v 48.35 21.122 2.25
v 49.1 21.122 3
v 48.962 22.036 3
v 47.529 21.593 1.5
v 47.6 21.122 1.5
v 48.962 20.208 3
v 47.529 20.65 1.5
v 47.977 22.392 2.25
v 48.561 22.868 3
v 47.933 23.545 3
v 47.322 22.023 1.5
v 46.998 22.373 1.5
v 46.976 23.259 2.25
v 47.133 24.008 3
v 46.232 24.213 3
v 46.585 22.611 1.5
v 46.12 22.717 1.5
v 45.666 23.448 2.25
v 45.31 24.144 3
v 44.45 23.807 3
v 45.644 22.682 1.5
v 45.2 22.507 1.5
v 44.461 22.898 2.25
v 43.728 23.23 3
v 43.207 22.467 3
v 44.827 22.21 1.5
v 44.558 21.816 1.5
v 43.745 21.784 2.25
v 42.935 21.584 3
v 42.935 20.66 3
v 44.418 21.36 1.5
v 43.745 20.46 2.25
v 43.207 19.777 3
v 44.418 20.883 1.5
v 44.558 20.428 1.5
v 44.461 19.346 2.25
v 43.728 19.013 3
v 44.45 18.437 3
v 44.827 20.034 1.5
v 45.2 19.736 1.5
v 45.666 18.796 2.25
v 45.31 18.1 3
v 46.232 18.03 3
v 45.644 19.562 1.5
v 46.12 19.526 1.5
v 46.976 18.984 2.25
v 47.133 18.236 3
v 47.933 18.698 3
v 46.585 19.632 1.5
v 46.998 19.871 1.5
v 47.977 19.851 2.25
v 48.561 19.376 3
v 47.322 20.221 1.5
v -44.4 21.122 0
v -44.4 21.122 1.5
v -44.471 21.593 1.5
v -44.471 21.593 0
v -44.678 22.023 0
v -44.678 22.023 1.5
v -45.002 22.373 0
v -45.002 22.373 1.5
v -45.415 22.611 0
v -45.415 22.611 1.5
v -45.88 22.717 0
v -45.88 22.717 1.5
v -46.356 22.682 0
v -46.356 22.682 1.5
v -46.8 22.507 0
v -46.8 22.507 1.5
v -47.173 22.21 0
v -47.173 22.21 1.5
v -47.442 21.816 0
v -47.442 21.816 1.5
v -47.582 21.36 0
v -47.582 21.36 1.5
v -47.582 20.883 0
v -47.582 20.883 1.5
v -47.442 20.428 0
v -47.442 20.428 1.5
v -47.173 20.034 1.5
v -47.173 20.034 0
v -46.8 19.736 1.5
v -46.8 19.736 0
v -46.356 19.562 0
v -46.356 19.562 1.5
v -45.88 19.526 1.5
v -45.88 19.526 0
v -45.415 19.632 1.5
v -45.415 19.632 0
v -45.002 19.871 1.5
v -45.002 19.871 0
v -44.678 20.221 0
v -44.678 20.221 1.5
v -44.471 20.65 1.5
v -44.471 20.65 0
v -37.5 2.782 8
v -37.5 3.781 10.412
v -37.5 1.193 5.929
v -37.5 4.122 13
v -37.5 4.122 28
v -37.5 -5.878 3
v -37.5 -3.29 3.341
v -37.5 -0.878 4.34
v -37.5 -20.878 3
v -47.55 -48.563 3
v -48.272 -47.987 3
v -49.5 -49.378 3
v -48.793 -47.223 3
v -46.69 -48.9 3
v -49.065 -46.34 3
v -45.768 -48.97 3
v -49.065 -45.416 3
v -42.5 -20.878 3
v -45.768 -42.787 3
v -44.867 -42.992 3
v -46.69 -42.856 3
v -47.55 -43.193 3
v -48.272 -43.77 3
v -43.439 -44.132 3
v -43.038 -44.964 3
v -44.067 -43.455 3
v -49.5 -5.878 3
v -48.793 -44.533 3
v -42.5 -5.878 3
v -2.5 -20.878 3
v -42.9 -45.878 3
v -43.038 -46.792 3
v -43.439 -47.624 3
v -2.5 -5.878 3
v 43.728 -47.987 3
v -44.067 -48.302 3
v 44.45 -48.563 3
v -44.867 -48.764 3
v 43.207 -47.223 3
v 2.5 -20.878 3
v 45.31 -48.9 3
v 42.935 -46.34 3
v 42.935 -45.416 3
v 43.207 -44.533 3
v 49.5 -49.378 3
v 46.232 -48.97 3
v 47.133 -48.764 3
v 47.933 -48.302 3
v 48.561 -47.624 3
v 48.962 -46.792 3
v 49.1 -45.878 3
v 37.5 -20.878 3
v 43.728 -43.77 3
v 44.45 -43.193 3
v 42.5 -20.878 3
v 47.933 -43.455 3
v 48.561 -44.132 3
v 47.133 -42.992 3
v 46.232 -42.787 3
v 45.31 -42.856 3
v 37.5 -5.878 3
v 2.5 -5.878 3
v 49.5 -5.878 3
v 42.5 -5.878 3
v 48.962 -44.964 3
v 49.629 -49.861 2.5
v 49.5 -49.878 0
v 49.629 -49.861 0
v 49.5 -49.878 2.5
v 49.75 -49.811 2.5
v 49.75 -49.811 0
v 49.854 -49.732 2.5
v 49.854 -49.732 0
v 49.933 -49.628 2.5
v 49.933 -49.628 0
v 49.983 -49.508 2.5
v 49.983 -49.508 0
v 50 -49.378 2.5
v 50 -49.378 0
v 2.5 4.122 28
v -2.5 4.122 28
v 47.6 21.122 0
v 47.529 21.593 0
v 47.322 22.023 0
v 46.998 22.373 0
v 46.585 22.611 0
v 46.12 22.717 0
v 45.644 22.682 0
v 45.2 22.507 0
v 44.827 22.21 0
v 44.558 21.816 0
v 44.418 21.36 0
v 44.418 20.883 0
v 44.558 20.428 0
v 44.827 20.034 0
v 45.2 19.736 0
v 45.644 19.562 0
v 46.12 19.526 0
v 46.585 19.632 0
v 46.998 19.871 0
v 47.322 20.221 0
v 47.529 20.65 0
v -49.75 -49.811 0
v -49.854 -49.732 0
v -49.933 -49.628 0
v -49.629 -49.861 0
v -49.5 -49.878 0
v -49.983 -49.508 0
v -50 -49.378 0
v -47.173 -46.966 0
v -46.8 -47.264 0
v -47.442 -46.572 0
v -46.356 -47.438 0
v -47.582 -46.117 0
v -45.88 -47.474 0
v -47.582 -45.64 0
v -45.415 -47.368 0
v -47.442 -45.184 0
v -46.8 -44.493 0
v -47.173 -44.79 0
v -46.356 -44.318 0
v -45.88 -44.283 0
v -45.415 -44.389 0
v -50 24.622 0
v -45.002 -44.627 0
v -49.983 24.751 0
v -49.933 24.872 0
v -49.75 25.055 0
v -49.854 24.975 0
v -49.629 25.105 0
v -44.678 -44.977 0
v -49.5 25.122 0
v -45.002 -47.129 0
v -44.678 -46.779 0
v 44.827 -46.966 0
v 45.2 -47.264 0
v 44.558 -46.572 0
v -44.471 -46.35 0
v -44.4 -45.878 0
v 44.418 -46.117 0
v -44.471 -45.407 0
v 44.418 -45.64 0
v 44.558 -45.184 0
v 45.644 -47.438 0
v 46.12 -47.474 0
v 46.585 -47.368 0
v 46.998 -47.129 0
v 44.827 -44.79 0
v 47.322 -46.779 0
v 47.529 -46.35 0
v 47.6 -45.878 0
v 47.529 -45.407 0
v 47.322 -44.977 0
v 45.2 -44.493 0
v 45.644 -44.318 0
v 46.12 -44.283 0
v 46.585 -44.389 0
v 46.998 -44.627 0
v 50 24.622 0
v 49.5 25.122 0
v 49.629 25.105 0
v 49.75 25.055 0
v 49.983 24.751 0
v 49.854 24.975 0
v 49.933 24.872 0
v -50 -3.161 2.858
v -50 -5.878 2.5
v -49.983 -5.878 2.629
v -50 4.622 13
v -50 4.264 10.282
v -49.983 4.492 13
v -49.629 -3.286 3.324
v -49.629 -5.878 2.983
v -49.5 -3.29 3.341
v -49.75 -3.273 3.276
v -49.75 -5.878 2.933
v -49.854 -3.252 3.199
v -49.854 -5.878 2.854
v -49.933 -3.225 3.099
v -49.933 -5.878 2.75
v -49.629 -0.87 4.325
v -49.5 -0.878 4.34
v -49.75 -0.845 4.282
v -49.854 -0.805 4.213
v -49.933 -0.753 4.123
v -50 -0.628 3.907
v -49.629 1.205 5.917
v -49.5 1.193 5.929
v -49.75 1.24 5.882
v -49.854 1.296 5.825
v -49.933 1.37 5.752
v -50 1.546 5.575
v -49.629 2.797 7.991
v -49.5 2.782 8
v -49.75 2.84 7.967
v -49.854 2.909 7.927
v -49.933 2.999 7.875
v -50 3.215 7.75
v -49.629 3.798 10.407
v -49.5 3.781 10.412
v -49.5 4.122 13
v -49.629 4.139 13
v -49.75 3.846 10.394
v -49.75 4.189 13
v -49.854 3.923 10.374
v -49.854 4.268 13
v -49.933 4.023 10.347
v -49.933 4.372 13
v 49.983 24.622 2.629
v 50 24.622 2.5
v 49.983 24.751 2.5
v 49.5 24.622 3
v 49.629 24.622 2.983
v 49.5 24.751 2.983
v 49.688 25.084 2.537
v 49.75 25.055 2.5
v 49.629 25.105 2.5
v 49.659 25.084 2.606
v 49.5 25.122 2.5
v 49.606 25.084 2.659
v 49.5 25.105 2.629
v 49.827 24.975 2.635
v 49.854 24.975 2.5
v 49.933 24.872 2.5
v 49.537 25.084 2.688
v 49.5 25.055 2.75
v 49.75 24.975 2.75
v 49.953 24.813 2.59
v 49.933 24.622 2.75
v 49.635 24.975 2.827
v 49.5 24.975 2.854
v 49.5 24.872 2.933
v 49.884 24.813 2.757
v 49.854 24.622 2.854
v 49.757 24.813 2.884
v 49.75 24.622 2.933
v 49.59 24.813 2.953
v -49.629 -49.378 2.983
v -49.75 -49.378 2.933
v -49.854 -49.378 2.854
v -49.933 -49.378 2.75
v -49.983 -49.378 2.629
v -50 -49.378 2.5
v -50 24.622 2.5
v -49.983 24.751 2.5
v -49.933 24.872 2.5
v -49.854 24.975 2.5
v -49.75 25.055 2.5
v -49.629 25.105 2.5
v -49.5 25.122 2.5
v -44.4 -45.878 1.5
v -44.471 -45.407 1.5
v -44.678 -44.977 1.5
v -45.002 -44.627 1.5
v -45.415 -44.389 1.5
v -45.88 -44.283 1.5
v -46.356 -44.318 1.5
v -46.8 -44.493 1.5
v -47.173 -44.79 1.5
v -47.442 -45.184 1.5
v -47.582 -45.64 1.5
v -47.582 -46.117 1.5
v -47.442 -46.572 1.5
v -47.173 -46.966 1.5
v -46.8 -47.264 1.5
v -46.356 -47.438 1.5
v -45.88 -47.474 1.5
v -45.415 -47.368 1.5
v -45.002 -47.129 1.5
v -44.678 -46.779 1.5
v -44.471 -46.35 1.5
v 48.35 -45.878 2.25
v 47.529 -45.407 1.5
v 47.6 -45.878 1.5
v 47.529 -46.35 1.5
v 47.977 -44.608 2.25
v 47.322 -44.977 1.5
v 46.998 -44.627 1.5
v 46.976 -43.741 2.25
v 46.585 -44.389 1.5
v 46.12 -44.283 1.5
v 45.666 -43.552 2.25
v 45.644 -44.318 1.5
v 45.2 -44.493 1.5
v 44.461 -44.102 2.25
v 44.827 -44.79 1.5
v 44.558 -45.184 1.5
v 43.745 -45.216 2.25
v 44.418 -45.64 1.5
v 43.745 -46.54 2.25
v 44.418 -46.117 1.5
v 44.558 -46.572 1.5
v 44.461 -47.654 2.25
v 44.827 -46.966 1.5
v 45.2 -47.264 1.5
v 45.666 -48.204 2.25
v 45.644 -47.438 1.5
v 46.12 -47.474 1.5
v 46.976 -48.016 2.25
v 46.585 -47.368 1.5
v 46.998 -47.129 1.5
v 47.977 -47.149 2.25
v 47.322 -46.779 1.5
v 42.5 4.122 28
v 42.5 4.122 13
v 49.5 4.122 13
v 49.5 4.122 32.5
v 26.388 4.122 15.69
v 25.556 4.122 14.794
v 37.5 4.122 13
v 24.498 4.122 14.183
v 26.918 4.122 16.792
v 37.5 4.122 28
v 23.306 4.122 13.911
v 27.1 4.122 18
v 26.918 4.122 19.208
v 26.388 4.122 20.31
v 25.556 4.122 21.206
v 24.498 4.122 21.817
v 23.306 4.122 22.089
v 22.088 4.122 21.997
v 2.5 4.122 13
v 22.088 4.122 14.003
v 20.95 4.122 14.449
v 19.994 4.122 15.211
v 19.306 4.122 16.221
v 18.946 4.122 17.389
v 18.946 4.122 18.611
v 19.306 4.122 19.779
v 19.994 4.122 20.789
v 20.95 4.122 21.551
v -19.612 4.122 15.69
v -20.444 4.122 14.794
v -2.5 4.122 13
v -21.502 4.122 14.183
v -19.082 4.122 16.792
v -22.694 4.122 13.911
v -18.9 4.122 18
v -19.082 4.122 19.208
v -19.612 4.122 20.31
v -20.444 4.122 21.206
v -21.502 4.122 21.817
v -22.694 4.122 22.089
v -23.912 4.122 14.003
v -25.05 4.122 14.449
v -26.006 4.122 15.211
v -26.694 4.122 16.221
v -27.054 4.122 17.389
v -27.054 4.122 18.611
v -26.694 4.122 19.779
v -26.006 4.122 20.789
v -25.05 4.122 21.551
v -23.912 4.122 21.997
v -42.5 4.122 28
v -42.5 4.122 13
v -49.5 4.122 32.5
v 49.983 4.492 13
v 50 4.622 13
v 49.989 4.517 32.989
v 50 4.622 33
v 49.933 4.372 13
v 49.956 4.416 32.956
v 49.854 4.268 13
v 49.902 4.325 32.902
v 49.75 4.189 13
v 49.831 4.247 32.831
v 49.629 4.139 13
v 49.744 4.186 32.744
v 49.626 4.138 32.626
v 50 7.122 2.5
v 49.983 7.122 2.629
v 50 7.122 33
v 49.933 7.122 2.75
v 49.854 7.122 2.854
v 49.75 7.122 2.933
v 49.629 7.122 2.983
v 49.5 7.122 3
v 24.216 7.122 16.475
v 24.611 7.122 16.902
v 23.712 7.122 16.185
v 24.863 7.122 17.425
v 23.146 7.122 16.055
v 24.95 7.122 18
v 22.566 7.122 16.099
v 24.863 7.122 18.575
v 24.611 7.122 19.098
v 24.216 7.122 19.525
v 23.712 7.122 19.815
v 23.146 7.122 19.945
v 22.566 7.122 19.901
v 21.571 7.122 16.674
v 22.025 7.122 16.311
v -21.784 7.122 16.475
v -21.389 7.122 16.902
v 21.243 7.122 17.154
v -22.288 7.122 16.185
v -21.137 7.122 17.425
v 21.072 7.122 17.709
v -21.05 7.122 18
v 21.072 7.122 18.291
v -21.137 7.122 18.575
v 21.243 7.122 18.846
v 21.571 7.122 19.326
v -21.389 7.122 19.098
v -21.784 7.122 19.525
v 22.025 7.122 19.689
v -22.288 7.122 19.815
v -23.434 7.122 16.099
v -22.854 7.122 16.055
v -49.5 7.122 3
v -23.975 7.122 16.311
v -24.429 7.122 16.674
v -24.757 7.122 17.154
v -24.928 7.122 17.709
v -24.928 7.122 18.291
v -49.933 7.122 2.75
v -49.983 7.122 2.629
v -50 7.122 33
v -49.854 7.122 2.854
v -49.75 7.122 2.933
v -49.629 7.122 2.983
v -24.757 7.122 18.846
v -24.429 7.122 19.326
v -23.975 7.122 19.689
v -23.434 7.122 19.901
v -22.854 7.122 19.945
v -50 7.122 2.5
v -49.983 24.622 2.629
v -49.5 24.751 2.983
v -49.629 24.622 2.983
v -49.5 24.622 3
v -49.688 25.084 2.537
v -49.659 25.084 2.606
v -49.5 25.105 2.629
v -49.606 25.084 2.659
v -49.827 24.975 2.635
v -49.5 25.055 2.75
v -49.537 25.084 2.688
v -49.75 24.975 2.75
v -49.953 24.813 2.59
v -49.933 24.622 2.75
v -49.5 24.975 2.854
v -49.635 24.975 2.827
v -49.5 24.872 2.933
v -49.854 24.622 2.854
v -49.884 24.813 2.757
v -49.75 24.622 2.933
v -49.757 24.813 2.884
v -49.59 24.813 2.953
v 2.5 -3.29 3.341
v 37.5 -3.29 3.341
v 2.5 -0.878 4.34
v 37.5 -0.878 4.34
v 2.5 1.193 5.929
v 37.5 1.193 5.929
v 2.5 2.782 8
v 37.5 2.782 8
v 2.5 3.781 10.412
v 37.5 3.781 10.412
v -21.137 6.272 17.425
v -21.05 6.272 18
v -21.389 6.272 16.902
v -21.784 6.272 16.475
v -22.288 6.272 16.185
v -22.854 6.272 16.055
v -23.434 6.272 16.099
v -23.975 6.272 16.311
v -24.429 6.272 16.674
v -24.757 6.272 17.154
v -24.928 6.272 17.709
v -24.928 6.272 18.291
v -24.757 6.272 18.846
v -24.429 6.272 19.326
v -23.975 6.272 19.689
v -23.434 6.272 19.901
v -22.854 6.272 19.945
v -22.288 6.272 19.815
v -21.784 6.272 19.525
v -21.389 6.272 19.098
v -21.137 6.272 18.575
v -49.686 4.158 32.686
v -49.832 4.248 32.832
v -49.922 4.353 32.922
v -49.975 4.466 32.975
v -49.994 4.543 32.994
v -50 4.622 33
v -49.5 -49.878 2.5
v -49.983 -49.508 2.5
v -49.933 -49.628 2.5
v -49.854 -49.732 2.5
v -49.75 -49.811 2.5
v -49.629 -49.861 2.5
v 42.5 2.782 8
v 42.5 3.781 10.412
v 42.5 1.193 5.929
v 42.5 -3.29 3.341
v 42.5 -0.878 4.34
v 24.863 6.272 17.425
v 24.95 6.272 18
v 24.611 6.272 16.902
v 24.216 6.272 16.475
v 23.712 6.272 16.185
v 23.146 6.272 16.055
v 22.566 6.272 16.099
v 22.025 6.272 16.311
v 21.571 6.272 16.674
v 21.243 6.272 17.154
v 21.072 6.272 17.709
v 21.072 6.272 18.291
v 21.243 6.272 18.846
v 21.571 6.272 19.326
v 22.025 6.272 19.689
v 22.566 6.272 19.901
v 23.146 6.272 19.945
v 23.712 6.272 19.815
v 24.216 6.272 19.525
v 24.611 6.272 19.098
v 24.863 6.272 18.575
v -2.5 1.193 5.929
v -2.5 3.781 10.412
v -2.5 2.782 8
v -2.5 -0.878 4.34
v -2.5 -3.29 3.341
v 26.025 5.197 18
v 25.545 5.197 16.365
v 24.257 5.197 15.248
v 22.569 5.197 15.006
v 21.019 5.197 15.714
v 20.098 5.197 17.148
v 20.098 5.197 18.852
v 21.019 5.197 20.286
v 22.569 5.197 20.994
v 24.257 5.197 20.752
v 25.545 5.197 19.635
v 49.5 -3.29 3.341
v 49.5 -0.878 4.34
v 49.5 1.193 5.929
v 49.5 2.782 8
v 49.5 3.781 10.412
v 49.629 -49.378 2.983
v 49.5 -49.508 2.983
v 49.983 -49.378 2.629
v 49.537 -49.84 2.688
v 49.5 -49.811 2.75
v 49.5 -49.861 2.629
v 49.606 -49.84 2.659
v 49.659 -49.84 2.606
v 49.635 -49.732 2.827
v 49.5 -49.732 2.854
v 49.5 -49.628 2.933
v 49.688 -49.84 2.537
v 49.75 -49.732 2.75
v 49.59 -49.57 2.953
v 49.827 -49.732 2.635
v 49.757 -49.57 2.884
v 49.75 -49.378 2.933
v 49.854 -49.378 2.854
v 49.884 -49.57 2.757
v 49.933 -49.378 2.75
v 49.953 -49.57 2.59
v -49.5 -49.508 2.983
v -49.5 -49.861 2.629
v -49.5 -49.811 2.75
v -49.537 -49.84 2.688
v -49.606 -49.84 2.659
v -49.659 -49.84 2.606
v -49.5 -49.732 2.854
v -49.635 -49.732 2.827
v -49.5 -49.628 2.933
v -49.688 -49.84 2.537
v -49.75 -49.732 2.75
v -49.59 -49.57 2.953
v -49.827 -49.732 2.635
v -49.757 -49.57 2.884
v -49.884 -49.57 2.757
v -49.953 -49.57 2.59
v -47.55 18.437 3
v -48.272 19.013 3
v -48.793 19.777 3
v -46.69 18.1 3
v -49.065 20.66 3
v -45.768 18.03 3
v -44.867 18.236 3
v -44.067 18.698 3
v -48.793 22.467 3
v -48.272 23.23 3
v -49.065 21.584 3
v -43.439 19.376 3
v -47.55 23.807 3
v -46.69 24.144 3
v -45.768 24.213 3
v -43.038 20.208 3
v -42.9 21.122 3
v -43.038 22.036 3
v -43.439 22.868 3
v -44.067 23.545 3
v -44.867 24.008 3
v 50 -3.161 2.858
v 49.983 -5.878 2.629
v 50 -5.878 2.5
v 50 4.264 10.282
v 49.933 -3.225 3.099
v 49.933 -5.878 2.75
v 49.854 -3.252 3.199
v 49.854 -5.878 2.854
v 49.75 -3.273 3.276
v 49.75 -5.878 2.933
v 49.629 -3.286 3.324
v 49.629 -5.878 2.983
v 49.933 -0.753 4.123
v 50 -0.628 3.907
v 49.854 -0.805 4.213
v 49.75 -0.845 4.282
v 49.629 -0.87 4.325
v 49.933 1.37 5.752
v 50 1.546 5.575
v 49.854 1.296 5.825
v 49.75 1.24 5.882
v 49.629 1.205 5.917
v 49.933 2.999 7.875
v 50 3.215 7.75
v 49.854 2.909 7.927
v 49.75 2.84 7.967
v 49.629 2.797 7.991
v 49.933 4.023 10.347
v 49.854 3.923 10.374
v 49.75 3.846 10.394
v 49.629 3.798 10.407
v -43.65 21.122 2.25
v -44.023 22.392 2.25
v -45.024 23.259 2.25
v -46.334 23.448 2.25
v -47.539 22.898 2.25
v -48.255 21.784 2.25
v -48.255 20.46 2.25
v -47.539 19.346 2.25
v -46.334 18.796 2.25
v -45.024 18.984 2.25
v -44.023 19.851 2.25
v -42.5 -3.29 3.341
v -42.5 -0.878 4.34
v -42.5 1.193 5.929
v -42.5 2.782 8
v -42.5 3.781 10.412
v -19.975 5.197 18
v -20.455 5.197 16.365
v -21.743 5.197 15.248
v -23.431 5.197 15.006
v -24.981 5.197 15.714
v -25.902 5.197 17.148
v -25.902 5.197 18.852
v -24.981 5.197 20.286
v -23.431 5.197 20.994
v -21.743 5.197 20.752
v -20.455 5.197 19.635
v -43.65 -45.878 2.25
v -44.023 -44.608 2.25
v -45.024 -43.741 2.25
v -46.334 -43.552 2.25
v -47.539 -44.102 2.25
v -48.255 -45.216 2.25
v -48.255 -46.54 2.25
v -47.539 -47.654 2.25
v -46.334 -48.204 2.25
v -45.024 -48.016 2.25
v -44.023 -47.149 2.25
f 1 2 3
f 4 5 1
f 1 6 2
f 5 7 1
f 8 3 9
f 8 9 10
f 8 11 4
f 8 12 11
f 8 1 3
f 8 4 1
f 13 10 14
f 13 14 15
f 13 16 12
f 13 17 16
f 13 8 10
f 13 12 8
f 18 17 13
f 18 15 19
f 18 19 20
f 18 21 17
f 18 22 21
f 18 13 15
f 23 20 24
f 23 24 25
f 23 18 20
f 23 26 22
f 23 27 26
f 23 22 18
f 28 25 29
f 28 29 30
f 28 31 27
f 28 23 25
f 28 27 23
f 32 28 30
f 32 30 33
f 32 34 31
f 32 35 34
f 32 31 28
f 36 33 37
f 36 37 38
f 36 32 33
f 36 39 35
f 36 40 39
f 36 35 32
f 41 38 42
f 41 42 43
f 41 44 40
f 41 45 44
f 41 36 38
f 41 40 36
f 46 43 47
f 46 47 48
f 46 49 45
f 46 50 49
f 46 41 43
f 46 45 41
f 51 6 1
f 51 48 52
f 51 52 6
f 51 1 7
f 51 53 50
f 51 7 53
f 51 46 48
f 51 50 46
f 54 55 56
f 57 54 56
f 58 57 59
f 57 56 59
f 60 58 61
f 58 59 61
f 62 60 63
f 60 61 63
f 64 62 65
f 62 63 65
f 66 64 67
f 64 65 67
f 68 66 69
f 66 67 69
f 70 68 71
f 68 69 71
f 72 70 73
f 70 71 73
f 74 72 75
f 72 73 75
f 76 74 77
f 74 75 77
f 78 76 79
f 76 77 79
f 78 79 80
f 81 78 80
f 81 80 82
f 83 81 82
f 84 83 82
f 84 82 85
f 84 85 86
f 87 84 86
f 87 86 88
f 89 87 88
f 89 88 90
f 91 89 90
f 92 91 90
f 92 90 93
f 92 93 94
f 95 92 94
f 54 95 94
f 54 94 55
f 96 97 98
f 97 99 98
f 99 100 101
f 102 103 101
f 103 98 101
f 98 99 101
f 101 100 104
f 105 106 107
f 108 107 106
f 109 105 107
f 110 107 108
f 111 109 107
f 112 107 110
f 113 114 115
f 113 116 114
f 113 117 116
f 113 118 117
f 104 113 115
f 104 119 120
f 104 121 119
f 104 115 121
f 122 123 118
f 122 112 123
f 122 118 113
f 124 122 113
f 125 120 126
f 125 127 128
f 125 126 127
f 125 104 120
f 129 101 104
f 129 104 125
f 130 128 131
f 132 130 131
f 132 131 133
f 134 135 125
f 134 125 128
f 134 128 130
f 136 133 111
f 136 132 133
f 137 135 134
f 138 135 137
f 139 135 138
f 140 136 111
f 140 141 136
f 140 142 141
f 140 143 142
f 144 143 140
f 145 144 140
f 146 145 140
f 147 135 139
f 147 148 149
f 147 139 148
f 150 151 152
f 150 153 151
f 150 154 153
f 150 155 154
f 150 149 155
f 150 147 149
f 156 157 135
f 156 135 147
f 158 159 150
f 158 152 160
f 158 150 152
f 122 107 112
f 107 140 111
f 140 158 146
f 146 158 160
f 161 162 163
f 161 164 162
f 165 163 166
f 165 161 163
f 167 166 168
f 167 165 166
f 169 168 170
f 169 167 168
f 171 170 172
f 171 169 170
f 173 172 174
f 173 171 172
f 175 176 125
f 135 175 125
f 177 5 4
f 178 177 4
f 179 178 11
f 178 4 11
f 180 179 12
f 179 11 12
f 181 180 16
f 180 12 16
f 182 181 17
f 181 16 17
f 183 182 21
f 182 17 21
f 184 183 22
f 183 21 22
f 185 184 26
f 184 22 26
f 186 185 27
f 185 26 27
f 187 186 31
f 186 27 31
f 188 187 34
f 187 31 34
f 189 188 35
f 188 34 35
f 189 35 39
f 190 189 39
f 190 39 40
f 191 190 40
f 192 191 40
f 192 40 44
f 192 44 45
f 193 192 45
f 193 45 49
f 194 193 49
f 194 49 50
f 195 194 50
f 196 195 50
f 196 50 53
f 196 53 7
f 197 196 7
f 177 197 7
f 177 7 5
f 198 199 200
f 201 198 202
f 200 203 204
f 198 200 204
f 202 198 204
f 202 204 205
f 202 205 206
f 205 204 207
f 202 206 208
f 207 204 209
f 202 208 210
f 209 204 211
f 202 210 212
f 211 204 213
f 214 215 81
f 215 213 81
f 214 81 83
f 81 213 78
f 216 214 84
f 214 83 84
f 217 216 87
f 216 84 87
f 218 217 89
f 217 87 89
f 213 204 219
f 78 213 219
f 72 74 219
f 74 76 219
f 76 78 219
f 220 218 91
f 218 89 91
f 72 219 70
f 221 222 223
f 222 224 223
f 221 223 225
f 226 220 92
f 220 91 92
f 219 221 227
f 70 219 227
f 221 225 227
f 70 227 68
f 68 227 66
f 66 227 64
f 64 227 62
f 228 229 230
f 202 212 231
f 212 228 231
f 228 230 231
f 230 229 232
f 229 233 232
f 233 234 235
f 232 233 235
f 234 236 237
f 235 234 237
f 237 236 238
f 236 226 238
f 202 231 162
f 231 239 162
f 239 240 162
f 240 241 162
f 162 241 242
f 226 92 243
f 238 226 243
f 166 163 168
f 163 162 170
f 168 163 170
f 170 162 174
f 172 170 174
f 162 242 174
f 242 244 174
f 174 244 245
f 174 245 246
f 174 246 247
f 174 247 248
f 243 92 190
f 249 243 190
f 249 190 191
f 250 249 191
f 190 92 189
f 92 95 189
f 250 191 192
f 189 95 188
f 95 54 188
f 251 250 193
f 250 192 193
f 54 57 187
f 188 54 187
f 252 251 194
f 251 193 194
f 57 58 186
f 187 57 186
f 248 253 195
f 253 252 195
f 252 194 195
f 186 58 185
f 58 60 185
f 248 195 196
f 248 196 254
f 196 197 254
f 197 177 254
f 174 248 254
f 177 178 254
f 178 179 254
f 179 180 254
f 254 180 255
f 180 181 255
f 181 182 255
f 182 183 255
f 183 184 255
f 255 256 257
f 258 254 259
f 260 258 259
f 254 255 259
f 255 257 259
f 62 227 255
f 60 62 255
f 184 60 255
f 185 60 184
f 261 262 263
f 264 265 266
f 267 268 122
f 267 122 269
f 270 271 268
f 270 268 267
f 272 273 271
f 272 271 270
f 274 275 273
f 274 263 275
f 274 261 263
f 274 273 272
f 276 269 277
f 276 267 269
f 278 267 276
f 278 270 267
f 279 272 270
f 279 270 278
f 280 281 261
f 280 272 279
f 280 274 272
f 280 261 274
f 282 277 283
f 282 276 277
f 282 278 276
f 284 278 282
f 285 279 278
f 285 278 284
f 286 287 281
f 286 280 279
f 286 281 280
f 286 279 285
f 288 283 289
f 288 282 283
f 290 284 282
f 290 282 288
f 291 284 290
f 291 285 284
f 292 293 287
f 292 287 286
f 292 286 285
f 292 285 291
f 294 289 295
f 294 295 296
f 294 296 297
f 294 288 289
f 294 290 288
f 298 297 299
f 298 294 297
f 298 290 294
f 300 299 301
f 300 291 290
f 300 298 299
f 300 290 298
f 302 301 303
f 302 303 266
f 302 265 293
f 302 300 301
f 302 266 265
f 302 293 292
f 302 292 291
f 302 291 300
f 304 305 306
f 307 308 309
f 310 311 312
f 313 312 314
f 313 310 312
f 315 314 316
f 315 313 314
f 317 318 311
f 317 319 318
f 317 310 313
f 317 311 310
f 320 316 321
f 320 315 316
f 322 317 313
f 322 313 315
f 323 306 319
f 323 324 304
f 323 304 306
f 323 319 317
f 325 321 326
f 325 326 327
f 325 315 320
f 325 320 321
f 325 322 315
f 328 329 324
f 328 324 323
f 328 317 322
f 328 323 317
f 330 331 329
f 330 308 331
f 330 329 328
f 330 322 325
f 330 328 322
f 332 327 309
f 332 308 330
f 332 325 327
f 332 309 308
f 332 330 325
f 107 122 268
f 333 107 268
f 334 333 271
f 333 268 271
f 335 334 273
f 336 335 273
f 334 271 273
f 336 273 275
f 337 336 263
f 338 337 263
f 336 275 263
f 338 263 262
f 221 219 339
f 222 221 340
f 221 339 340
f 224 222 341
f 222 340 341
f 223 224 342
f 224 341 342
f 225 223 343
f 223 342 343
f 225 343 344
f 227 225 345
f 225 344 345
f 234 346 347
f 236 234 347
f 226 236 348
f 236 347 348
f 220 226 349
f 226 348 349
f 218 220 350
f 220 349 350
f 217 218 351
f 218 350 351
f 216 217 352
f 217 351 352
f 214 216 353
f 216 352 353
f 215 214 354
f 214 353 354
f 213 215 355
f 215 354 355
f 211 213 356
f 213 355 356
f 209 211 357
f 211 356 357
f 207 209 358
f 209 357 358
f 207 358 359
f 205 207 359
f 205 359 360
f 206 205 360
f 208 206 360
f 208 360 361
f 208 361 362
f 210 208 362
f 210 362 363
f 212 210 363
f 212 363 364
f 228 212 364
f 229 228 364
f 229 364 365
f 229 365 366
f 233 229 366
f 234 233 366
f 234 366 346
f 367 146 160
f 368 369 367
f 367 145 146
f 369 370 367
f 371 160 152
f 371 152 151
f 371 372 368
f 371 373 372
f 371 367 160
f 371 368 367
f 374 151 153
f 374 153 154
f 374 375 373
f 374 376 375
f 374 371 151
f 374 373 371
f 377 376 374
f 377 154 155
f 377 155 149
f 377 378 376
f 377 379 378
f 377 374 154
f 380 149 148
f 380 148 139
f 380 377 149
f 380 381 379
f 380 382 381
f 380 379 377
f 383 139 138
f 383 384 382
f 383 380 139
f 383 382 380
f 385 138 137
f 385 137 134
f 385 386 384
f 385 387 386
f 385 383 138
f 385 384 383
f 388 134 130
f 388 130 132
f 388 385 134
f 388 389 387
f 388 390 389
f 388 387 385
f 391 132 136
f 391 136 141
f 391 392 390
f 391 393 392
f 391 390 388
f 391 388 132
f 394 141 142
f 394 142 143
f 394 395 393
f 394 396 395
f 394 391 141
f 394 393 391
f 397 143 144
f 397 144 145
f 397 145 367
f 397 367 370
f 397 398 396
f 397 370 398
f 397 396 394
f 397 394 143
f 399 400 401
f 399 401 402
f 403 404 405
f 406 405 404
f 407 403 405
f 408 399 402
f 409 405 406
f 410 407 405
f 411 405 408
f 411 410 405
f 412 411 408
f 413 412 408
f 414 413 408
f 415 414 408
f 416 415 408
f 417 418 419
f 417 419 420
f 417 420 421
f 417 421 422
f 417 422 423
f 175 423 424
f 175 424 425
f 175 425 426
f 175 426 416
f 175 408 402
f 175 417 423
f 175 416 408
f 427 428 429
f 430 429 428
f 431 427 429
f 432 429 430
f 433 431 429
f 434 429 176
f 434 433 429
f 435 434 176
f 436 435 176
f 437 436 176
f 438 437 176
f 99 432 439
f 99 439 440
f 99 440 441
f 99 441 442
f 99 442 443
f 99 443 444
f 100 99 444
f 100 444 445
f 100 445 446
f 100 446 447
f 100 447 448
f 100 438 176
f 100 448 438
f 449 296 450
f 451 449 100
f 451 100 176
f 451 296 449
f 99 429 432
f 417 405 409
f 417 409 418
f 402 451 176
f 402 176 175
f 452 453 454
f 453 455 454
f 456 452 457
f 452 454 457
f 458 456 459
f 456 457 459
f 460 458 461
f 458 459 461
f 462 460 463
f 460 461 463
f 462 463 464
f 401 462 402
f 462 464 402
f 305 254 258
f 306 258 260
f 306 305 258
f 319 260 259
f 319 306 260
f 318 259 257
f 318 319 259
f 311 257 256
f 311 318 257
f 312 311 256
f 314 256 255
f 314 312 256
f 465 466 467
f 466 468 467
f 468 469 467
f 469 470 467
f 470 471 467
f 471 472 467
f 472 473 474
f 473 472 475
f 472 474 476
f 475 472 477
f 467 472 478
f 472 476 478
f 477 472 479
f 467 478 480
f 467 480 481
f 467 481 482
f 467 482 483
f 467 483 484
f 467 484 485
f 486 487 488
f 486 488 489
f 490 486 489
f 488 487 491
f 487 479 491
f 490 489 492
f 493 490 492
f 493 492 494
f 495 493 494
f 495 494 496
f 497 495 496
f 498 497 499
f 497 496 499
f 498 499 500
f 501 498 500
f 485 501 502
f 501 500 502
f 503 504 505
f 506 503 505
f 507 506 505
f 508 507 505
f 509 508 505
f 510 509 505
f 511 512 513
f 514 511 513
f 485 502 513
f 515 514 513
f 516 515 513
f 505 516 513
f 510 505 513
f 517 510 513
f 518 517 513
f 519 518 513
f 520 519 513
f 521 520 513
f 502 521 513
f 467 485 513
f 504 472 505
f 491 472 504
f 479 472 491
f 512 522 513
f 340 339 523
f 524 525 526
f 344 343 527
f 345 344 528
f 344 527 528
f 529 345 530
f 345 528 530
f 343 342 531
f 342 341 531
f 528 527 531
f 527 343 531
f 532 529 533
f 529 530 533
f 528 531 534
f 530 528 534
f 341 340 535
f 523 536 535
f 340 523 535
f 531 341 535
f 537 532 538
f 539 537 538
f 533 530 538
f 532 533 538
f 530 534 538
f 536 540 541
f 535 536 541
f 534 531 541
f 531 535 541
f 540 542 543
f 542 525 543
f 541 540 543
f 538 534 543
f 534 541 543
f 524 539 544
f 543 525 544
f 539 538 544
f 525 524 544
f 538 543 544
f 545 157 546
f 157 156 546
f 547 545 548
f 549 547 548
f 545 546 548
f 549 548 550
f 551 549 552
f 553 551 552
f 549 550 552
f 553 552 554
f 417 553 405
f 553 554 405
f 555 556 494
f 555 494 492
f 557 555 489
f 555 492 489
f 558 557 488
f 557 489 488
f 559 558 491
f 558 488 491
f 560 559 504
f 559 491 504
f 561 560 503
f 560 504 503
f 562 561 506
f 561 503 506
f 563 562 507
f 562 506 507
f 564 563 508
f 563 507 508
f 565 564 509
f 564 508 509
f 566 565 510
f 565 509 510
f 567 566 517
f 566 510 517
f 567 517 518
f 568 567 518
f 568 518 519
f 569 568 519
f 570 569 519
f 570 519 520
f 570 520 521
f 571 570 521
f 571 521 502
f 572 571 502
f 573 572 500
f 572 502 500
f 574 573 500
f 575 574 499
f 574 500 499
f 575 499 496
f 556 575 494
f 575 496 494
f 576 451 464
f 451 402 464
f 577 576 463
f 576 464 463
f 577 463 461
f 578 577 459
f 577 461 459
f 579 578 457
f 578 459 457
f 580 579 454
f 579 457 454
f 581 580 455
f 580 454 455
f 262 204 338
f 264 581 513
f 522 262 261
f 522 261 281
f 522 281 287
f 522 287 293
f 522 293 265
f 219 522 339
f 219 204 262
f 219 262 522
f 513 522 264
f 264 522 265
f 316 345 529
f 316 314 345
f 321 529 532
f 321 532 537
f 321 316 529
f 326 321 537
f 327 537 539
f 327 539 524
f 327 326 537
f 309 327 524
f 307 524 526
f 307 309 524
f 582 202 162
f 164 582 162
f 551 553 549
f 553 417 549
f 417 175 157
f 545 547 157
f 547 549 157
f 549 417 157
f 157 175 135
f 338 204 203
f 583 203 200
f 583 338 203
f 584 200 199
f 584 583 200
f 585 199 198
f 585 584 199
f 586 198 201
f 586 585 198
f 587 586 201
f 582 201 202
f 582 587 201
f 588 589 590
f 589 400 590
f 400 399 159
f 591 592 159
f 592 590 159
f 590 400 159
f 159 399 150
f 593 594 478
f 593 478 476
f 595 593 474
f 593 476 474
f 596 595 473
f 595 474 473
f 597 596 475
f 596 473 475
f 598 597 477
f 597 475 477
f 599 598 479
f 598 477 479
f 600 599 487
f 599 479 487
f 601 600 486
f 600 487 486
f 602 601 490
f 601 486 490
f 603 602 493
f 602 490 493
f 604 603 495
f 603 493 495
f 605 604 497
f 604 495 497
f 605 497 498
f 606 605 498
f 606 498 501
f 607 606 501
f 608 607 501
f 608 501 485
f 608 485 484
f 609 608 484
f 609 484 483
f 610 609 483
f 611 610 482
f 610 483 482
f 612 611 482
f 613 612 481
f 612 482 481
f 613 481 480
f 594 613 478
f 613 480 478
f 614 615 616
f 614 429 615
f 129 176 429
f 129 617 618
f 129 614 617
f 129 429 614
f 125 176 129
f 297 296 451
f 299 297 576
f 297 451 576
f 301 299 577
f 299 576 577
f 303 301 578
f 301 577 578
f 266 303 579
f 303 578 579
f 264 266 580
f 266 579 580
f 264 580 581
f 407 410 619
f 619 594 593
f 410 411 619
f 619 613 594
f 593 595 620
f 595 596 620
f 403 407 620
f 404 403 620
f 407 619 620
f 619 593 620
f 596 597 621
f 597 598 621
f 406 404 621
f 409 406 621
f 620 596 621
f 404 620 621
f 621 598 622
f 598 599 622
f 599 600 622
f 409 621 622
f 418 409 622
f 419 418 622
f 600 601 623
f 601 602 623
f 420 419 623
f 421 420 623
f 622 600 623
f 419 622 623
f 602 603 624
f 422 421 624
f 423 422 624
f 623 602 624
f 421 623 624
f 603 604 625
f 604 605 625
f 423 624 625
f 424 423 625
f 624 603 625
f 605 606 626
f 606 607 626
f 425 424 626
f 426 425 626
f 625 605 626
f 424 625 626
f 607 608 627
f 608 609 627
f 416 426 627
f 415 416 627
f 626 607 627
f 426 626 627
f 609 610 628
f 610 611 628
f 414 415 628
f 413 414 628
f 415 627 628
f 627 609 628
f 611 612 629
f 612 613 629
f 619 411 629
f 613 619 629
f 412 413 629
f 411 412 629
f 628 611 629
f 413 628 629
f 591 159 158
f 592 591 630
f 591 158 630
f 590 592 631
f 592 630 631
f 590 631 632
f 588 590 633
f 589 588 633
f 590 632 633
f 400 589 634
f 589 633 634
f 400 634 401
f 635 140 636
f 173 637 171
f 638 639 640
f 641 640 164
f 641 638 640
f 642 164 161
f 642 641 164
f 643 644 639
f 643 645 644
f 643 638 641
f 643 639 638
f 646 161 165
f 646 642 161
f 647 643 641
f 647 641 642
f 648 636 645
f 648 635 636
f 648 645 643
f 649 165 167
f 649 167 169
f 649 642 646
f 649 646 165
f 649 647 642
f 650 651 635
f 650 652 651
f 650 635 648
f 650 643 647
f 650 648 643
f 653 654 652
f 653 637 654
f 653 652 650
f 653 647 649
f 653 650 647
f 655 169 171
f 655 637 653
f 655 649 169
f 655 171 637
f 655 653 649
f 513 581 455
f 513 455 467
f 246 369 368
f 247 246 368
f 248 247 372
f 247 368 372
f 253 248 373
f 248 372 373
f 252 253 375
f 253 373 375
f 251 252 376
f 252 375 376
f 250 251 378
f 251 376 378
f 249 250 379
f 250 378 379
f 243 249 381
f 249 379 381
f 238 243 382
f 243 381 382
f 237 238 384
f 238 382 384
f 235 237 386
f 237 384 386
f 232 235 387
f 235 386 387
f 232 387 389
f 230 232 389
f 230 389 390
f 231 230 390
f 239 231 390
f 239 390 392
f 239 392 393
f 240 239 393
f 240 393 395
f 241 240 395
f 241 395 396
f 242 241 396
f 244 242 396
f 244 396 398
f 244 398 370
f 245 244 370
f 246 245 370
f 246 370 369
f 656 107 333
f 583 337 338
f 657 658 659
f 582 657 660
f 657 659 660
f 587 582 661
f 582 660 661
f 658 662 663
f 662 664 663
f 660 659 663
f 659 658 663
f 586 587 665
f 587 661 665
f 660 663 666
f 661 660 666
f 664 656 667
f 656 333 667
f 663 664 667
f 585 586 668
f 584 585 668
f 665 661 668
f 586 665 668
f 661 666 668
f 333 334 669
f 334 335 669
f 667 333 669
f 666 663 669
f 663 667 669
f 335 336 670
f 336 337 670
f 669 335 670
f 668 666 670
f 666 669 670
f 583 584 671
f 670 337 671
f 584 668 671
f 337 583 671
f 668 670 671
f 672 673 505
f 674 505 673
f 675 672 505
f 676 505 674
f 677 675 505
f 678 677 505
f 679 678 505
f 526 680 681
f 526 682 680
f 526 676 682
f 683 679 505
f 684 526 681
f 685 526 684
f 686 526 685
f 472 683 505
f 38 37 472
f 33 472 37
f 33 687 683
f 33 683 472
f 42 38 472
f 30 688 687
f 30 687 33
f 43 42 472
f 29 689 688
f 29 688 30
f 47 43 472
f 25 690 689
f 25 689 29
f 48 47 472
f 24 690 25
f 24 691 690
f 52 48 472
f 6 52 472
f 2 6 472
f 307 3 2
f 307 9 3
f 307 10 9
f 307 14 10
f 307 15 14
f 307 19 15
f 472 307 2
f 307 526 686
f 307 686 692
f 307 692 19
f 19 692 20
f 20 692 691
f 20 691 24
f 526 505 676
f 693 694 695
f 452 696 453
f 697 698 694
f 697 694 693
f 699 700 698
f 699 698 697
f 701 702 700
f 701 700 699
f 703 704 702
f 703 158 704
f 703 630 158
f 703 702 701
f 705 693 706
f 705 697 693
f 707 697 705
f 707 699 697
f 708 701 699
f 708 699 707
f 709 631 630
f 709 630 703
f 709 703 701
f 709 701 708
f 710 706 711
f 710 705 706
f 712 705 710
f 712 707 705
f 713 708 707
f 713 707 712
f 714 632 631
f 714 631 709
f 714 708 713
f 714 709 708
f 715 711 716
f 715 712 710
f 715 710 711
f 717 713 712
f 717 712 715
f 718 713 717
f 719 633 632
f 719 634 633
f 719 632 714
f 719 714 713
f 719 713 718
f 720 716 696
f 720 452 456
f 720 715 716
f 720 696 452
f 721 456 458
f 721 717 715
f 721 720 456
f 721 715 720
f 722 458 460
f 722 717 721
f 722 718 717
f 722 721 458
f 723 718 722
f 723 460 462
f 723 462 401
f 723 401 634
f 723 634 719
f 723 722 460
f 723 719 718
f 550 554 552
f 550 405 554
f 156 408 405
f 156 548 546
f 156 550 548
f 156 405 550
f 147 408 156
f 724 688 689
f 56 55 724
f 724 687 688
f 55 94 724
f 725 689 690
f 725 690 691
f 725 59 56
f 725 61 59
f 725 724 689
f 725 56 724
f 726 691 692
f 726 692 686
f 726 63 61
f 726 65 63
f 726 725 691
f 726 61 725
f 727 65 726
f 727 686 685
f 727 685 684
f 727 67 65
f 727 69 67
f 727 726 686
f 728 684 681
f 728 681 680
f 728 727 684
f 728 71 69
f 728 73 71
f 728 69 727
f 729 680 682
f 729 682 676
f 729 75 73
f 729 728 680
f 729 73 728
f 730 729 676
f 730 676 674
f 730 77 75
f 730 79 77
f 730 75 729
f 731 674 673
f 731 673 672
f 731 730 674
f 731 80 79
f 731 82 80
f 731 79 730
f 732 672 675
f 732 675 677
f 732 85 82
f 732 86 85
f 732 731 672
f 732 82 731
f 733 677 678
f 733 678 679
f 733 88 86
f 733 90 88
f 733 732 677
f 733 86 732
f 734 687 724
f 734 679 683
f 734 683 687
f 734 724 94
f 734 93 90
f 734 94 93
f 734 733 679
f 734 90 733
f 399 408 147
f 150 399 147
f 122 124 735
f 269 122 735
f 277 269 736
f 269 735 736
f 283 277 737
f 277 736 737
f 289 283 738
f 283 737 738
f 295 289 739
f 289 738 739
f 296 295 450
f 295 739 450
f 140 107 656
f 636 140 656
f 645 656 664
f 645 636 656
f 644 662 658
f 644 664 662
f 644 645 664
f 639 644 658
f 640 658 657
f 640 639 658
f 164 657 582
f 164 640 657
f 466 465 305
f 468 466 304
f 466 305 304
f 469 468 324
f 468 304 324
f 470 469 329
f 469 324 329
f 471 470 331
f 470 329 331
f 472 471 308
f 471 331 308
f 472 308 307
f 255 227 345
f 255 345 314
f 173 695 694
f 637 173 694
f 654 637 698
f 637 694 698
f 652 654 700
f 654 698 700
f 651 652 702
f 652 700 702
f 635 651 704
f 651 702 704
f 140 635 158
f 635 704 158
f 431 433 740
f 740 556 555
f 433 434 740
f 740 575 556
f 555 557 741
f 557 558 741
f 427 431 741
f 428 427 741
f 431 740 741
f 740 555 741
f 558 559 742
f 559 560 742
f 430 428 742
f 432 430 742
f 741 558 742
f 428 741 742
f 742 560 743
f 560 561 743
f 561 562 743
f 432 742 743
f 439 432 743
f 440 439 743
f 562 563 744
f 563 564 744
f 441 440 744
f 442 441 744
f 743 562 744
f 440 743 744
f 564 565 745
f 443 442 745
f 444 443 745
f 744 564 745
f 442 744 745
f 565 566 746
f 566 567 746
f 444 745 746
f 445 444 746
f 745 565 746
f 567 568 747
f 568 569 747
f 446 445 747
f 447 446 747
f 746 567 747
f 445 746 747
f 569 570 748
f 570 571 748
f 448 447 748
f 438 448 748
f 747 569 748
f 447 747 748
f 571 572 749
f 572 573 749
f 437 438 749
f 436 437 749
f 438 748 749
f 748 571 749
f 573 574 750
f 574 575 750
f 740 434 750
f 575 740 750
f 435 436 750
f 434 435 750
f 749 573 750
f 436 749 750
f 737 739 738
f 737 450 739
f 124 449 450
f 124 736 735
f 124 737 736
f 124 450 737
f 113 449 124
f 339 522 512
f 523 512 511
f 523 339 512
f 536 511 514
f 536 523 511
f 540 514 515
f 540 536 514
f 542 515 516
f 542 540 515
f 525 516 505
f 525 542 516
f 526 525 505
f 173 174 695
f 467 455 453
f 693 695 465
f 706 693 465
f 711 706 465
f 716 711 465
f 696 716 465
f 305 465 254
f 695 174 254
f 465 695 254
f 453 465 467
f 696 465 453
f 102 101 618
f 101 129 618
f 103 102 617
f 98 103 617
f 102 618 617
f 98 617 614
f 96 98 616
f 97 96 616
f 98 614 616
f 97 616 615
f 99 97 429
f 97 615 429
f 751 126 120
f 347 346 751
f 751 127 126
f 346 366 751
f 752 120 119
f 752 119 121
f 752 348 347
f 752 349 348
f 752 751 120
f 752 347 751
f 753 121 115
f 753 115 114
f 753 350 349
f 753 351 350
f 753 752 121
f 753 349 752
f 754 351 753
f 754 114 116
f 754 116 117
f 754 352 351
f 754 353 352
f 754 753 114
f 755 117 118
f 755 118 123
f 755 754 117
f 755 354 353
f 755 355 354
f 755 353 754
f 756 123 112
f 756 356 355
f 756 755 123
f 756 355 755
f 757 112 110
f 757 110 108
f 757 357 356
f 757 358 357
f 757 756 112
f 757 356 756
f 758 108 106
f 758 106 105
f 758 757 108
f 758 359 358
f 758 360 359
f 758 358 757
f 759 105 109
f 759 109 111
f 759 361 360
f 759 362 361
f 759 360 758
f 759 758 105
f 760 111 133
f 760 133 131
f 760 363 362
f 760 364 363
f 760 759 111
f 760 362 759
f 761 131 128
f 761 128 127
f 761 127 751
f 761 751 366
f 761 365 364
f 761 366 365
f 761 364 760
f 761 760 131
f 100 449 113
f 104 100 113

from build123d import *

# Parameters (mm, degrees)
SZKIC1_W                                             = 100
SZKIC1_H                                             = 75
DODANIE_WYCI_GNI_CIE1_DEPTH                          = 3
SZKIC2_W                                             = 30
SZKIC2_H                                             = 3
DODANIE_WYCI_GNI_CIE2_DEPTH                          = 100
EBRO6_REACH                                          = 98.1
SZKIC3_WALL_W                                        = 229.555755292
SZKIC3_WALL_H                                        = 5
SZYK_LINIOWY1_COUNT                                  = 2
SZYK_LINIOWY1_PITCH                                  = 40
SZYK_LINIOWY2_COUNT                                  = 2
SZYK_LINIOWY2_PITCH                                  = 40
SZKIC4_R                                             = 1.6
WYTNIJ_WYCI_GNI_CIE1_DEPTH                           = 77.732214276
SFAZOWANIE1_SIZE                                     = 1.5
POG_BIENIE_STO_KOWE_POD_M3_5_WKR_T_DO_CZ_D           = 3.9
POG_BIENIE_STO_KOWE_POD_M3_5_WKR_T_DO_CZ_CSINK_D     = 8.2
POG_BIENIE_STO_KOWE_POD_M3_5_WKR_T_DO_CZ_CSINK_ANGLE = 90
ZAOKR_GLENIE1_R                                      = 10
ZAOKR_GLENIE2_R                                      = 0.5


with BuildPart() as part:
    # Szkic1 → Dodanie-wyciągnięcie1 (new body)
    with BuildSketch(Plane.XY):
        with Locations((0, -12.378178673)):
            Rectangle(SZKIC1_W, SZKIC1_H)
    extrude(amount=DODANIE_WYCI_GNI_CIE1_DEPTH)

    # Szkic2 → Dodanie-wyciągnięcie2 (add)
    with BuildSketch(Plane.ZY.offset(50)):
        with Locations((18, 5.621821327)):
            Rectangle(SZKIC2_W, SZKIC2_H)
    extrude(amount=-DODANIE_WYCI_GNI_CIE2_DEPTH)

    # Szkic3 wall → Żebro6 (add, up to next)
    with BuildSketch(Plane(origin=(0, -8.378178673, 15.5), x_dir=(0, -0.707106781187, -0.707106781187), z_dir=(0, 0.707106781187, -0.707106781187)), mode=Mode.PRIVATE) as ebro6_sk1:
        Rectangle(SZKIC3_WALL_W, SZKIC3_WALL_H)
    ebro6_tool1 = extrude(ebro6_sk1.sketch, amount=EBRO6_REACH, mode=Mode.PRIVATE) - part.part
    ebro6 = ebro6_tool1.solids().sort_by_distance((0, -8.378178673, 15.5))[0]
    add(ebro6)

    # Szyk liniowy1: Żebro6 ×2
    with Locations(*[(-i * SZYK_LINIOWY1_PITCH, 0, 0) for i in range(1, SZYK_LINIOWY1_COUNT)]):
        add(ebro6)

    # Szyk liniowy2: Żebro6 ×2
    with Locations(*[(i * SZYK_LINIOWY2_PITCH, 0, 0) for i in range(1, SZYK_LINIOWY2_COUNT)]):
        add(ebro6)

    # Szkic4 → Wytnij-wyciągnięcie1 (cut, through all)
    with BuildSketch(Plane.XY.offset(3)):
        with Locations((46, -45.878178673)):
            Circle(SZKIC4_R)
        with Locations((-46, -45.878178673)):
            Circle(SZKIC4_R)
        with Locations((46, 21.121821327)):
            Circle(SZKIC4_R)
        with Locations((-46, 21.121821327)):
            Circle(SZKIC4_R)
    extrude(amount=-WYTNIJ_WYCI_GNI_CIE1_DEPTH, mode=Mode.SUBTRACT)

    # Sfazowanie1
    sfazowanie1_edges = [part.edges().sort_by_distance(p)[0] for p in [
        (-47.6, -45.878178673, 3),
        (44.4, 21.121821327, 3),
        (-47.6, 21.121821327, 3),
        (44.4, -45.878178673, 3),
    ]]
    chamfer(sfazowanie1_edges, length=SFAZOWANIE1_SIZE)

    # Pogłębienie stożkowe pod M3.5 wkręt do części metalowych z łbem soczewkowym1 (through all)
    with Locations(Plane(origin=(0, 4.121821327, 0), x_dir=(-1, 0, 0), z_dir=(0, -1, 0))):
        with Locations((-23, -18), (23, -18)):
            CounterSinkHole(POG_BIENIE_STO_KOWE_POD_M3_5_WKR_T_DO_CZ_D / 2, POG_BIENIE_STO_KOWE_POD_M3_5_WKR_T_DO_CZ_CSINK_D / 2, counter_sink_angle=POG_BIENIE_STO_KOWE_POD_M3_5_WKR_T_DO_CZ_CSINK_ANGLE)

    # Zaokrąglenie1
    zaokr_glenie1_edges = [part.edges().sort_by_distance(p)[0] for p in [
        (46.25, 4.121821327, 3),
        (-20, 4.121821327, 3),
        (-46.25, 4.121821327, 3),
        (20, 4.121821327, 3),
    ]]
    fillet(zaokr_glenie1_edges, radius=ZAOKR_GLENIE1_R)

    # Zaokrąglenie2
    zaokr_glenie2_edges = [part.edges().sort_by_distance(p)[0] for p in [
        (-50, 16.121821327, 3),
        (50, 16.121821327, 3),
        (-50, -27.878178673, 3),
        (-50, 4.121821327, 23),
        (50, 1.192889139, 5.928932188),
        (-50, 1.192889139, 5.928932188),
        (0, 4.121821327, 33),
        (0, -49.878178673, 3),
        (50, 4.121821327, 23),
        (50, -27.878178673, 3),
        (50, -49.878178673, 1.5),
        (-50, -49.878178673, 1.5),
        (-50, 25.121821327, 1.5),
        (50, 25.121821327, 1.5),
        (0, 25.121821327, 3),
    ]]
    fillet(zaokr_glenie2_edges, radius=ZAOKR_GLENIE2_R)


solid = part.part
